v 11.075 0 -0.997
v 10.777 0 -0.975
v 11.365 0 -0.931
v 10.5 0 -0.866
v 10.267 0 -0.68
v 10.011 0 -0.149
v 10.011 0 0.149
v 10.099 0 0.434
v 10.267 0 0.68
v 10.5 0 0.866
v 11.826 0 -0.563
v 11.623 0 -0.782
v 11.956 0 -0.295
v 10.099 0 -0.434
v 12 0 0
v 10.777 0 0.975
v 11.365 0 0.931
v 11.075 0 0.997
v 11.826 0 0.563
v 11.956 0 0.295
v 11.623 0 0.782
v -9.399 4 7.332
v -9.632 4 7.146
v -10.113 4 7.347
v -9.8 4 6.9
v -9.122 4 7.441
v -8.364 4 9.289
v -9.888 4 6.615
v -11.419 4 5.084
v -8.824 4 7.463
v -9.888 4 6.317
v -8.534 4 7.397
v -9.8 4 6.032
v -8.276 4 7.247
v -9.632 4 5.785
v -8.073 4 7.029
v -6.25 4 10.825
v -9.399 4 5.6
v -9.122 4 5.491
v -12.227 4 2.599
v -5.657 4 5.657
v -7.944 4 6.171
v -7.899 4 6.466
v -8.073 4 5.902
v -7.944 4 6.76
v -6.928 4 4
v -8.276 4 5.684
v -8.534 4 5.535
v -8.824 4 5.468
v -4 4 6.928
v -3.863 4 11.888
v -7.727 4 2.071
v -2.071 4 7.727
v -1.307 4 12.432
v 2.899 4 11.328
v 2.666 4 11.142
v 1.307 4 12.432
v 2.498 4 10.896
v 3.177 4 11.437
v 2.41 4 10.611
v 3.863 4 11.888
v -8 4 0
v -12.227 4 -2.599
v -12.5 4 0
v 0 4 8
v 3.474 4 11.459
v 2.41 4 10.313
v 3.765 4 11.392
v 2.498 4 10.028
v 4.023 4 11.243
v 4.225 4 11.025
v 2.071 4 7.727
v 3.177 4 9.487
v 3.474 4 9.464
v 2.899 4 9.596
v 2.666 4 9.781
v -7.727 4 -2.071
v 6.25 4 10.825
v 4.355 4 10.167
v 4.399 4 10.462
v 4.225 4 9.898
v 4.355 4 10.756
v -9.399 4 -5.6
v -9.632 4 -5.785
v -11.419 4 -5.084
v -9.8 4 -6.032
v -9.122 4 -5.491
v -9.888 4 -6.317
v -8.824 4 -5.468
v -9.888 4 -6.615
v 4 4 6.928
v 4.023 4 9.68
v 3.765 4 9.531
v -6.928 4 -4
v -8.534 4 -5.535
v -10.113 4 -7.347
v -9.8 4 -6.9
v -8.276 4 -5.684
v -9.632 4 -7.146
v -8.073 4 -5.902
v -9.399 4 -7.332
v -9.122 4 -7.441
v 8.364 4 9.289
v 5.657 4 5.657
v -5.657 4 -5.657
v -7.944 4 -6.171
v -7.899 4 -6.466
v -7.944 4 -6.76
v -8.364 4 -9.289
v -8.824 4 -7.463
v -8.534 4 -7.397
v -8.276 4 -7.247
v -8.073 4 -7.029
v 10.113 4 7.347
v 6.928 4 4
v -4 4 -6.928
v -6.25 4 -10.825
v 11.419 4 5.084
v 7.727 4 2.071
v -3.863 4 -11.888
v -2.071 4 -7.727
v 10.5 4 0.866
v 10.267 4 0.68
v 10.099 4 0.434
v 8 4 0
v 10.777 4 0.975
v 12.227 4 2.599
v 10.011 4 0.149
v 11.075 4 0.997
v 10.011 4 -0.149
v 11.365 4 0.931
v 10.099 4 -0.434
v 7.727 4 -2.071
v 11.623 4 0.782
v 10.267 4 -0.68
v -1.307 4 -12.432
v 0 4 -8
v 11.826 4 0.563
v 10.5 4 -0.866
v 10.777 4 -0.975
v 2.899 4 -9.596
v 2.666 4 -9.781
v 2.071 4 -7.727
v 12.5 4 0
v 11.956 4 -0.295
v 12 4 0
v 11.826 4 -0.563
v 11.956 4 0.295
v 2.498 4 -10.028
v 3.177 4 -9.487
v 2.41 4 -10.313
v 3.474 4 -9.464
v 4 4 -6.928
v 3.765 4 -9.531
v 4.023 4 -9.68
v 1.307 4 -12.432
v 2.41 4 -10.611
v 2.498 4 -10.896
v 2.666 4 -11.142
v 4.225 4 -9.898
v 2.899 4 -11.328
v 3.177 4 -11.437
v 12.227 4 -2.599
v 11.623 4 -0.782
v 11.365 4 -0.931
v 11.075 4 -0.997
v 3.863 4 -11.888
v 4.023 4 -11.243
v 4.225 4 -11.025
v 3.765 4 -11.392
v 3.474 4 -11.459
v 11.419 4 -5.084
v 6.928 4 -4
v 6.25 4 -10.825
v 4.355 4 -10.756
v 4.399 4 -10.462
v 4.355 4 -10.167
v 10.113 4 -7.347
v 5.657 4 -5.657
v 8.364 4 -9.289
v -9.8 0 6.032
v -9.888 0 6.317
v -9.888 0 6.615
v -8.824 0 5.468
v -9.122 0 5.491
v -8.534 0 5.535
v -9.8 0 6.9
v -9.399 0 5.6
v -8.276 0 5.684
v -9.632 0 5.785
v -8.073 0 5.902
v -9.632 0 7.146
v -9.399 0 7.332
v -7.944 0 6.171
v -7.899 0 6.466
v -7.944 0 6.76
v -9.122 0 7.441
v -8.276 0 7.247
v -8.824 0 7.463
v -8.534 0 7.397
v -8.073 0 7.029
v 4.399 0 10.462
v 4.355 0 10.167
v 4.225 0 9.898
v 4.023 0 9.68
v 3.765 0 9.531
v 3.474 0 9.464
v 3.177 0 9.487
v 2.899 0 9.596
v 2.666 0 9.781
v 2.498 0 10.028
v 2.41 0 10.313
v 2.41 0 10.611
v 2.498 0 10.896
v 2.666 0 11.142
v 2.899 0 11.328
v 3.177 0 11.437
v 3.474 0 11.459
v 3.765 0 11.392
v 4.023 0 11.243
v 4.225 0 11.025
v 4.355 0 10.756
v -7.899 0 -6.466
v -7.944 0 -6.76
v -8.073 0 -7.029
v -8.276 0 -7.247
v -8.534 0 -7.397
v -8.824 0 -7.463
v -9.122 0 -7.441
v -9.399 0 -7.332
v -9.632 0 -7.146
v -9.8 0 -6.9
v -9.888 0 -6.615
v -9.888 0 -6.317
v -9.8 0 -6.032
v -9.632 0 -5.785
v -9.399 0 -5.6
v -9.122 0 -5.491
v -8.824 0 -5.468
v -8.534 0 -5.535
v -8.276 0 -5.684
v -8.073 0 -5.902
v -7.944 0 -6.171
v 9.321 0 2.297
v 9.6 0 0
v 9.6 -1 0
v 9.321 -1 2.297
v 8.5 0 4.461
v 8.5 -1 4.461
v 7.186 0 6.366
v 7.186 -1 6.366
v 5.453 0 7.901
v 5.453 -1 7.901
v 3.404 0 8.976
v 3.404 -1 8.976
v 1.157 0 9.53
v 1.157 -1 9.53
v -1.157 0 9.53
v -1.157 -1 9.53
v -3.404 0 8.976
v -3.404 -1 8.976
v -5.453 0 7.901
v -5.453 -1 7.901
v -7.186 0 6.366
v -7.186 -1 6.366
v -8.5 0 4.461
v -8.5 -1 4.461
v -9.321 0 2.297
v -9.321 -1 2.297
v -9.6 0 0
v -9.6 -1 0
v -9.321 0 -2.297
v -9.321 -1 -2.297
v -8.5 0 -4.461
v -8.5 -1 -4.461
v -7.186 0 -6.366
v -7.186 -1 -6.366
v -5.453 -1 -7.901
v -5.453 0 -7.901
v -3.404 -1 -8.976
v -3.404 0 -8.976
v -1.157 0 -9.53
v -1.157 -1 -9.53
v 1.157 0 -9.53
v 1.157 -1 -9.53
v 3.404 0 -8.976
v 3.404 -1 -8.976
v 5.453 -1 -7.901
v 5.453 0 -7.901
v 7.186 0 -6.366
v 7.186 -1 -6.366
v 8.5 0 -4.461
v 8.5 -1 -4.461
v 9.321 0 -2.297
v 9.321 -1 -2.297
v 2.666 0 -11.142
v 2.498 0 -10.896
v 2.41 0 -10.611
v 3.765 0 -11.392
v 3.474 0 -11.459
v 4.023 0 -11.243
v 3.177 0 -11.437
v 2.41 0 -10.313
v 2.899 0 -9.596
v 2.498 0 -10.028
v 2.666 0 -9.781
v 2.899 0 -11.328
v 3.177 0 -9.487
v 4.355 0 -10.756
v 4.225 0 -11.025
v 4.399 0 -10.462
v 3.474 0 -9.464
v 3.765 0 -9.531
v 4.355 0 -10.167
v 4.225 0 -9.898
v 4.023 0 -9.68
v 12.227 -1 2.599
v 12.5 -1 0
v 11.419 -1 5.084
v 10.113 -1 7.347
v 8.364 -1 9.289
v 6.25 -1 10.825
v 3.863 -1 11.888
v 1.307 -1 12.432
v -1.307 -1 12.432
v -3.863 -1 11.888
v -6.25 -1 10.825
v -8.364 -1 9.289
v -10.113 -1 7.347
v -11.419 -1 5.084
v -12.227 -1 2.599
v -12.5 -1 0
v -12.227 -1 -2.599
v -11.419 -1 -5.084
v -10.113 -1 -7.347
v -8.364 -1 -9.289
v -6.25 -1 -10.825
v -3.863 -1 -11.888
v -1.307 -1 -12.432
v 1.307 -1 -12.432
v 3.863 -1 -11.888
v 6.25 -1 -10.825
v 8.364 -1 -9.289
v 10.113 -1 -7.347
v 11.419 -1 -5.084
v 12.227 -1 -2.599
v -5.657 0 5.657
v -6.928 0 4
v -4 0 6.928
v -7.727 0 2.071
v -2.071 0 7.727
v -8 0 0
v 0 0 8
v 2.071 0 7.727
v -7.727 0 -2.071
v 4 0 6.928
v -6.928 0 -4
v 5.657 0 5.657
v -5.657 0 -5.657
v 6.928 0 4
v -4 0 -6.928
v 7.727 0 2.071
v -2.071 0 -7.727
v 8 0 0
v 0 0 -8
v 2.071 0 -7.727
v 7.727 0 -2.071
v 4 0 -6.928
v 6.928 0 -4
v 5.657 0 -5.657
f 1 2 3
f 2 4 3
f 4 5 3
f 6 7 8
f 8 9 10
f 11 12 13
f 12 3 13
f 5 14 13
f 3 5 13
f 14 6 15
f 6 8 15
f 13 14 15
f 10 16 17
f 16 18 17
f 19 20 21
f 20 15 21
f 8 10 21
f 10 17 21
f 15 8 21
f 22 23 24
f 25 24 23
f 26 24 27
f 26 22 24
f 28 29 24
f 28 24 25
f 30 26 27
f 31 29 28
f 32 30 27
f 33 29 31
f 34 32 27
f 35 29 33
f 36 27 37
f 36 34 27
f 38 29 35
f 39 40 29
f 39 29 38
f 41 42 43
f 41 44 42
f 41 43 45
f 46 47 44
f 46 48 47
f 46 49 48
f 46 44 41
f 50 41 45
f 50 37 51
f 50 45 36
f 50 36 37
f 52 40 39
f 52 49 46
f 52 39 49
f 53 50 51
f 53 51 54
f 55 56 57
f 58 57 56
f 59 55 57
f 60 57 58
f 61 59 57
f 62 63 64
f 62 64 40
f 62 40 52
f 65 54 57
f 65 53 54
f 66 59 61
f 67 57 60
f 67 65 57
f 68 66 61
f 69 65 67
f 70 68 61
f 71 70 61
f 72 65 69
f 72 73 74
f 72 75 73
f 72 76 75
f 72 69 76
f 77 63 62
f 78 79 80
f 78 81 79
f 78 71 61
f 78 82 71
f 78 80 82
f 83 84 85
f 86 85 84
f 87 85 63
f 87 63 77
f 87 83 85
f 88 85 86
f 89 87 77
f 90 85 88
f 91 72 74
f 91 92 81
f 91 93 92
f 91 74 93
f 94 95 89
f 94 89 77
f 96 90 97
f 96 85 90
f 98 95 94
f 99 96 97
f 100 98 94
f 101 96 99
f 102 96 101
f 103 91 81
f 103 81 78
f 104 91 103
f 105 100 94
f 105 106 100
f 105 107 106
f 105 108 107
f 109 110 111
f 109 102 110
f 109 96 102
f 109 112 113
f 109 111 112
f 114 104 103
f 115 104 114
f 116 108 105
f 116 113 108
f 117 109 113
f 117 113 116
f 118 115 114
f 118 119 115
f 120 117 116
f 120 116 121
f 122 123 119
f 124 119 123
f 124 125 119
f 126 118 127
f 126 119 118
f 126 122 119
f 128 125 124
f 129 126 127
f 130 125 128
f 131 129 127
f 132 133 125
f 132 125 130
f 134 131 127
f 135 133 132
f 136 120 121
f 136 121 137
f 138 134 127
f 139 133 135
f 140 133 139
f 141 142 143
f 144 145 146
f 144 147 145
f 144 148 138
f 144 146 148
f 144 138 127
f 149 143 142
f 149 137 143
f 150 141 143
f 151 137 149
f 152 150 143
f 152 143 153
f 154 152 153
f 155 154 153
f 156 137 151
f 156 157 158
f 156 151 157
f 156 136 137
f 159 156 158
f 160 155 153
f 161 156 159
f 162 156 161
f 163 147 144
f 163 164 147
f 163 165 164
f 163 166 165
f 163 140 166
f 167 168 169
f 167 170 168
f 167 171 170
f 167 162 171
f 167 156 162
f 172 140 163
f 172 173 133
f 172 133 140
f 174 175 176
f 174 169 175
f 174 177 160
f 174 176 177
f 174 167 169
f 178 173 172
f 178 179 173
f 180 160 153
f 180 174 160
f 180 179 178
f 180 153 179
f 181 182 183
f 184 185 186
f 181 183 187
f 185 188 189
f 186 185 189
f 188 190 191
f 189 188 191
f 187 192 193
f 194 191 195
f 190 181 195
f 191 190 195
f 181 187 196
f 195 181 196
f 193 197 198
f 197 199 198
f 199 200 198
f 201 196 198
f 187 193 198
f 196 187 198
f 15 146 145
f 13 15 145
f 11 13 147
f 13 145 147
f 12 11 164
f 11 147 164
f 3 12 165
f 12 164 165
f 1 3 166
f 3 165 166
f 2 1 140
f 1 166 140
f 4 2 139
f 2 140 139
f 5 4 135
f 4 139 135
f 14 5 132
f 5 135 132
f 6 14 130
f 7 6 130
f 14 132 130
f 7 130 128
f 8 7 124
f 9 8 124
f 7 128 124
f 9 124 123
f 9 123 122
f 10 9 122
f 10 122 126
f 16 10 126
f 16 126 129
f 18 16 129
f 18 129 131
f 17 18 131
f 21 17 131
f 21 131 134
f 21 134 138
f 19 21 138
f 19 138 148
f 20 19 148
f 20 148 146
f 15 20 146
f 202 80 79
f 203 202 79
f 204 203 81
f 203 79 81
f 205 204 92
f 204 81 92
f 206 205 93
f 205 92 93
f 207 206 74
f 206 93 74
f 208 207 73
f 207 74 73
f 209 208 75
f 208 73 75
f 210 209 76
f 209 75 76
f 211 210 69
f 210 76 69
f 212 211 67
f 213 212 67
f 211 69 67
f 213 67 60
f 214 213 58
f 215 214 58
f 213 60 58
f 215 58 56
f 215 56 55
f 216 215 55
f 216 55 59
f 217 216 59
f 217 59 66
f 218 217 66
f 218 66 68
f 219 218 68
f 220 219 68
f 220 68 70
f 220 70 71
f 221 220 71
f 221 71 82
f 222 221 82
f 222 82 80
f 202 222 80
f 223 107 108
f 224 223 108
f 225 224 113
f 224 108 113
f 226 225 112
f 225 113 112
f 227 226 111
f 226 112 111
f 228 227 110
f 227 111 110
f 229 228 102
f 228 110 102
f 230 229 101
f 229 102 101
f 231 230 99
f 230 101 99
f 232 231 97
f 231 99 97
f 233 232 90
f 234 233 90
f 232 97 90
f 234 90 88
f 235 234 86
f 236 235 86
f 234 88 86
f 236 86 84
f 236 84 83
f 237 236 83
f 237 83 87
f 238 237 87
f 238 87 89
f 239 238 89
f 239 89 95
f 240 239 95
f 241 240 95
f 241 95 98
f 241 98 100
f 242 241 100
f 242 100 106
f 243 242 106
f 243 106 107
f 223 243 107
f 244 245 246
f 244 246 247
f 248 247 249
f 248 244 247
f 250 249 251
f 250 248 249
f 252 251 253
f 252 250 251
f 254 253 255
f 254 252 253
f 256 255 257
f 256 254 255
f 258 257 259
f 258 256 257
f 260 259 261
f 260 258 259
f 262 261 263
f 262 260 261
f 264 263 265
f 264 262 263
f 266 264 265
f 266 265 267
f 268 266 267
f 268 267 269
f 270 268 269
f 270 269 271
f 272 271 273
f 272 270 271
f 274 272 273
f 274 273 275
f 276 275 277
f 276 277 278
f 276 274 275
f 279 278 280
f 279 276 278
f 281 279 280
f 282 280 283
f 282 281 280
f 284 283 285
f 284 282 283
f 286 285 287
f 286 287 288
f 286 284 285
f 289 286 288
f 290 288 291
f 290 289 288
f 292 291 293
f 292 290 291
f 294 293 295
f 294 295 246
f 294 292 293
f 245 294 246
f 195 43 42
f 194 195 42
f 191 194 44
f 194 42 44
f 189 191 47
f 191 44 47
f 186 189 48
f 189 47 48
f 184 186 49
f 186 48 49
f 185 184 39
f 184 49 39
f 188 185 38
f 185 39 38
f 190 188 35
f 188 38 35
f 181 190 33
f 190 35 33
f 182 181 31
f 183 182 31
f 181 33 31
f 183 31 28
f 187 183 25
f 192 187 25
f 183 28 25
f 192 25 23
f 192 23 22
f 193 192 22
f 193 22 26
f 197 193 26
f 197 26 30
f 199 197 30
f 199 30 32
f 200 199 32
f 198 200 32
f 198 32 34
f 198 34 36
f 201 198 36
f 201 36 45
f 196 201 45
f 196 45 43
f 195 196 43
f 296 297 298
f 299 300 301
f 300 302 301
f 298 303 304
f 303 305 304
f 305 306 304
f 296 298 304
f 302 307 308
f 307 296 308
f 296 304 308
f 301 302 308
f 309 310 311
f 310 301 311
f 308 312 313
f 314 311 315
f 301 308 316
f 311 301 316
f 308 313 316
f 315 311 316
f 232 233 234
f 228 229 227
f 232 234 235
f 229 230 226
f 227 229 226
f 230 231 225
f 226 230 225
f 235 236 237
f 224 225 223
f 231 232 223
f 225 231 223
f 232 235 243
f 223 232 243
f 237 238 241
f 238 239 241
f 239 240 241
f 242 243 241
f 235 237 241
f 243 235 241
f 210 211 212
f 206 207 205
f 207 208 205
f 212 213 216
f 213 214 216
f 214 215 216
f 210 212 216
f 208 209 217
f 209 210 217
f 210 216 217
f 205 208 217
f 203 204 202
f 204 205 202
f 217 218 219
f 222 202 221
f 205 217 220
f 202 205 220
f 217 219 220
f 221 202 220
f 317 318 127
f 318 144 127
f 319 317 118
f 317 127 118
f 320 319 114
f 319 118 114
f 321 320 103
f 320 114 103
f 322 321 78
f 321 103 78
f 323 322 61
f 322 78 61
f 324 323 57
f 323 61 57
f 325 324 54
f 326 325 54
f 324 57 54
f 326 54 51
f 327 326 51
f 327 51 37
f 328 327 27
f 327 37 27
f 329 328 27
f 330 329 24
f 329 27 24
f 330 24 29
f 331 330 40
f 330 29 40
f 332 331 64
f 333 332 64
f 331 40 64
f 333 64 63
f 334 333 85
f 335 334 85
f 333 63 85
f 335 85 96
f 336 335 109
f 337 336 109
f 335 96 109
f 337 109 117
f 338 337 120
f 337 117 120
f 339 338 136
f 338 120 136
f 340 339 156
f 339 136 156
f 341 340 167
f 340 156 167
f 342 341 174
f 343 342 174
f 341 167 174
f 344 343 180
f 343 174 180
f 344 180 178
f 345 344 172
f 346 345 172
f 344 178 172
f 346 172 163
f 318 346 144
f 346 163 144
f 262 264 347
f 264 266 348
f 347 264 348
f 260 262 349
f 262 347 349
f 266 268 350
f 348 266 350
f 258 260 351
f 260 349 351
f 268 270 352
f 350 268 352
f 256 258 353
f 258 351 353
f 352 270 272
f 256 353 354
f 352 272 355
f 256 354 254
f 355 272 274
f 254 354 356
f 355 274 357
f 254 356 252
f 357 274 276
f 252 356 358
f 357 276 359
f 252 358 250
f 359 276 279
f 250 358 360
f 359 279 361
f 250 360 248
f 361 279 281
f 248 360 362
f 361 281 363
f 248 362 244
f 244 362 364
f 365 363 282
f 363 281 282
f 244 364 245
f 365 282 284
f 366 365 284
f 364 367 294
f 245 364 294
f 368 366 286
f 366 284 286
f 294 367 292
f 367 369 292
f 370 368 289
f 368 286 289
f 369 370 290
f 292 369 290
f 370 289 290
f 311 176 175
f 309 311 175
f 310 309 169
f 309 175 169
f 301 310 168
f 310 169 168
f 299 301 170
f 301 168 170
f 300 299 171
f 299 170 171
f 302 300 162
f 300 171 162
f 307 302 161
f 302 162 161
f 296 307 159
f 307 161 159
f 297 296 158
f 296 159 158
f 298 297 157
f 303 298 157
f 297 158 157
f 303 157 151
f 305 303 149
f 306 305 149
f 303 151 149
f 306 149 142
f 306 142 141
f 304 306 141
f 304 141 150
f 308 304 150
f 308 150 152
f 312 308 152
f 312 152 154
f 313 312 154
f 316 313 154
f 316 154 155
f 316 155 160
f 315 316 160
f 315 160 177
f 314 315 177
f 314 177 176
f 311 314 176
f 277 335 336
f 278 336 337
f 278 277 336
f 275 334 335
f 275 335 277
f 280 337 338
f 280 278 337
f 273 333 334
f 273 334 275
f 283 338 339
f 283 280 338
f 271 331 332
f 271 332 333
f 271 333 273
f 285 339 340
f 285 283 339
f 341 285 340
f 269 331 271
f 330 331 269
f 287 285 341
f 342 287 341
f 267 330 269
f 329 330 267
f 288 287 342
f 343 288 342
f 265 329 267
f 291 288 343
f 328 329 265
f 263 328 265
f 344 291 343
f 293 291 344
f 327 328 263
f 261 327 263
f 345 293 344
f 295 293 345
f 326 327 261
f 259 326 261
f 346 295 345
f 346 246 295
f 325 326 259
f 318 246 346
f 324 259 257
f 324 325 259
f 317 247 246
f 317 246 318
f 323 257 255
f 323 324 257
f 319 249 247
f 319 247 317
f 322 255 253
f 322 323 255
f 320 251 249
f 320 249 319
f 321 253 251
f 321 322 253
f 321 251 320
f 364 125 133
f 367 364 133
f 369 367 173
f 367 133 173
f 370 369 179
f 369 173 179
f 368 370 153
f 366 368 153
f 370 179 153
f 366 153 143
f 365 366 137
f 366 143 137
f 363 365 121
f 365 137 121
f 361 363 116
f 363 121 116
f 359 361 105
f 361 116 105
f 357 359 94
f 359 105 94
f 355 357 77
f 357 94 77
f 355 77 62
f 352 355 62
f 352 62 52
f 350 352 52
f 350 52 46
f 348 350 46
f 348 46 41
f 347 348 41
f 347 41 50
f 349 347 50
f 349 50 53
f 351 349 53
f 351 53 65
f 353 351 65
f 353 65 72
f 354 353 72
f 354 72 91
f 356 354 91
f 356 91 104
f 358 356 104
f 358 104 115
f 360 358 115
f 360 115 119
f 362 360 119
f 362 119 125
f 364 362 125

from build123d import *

# Parameters (mm, degrees)
SKETCH_1_R          = 12.5
EXTRUDE_1_DEPTH     = 4
SKETCH_2_R          = 1
EXTRUDE_2_DEPTH     = 7.5
SKETCH_5_R          = 6
CUT_EXTRUDE_1_DEPTH = 10
SKETCH_7_R          = 1
CUT_EXTRUDE_2_DEPTH = 7.5
SKETCH_8_R          = 12.5
SKETCH_8_R_2        = 6
CUT_EXTRUDE_3_DEPTH = 10
SKETCH_9_R          = 1
EXTRUDE_3_DEPTH     = 10
SKETCH_10_R         = 1
CUT_EXTRUDE_4_DEPTH = 14
SKETCH_11_R         = 8
CUT_EXTRUDE_5_DEPTH = 10
SKETCH_13_R         = 12.5
SKETCH_13_R_2       = 9.6
EXTRUDE_5_DEPTH     = 1


with BuildPart() as part:
    # 草图1 → 凸台-拉伸1 (new body)
    with BuildSketch(Plane(origin=(0, 0, 0), x_dir=(1, 0, 0), z_dir=(0, 1, 0))):
        Circle(SKETCH_1_R)
    extrude(amount=EXTRUDE_1_DEPTH)

    # 草图2 → 凸台-拉伸2 (add)
    with BuildSketch(Plane(origin=(0, 4, 0), x_dir=(1, 0, 0), z_dir=(0, 1, 0))):
        with Locations((10, 0)):
            Circle(SKETCH_2_R)
        with Locations((3.399186938, -10.461621679)):
            Circle(SKETCH_2_R)
        with Locations((-8.590169944, -7.416694292)):
            Circle(SKETCH_2_R)
        with Locations((-9.399186938, 4.926796007)):
            Circle(SKETCH_2_R)
        with Locations((2.090169944, 9.510565163)):
            Circle(SKETCH_2_R)
    extrude(amount=EXTRUDE_2_DEPTH)

    # 草图5 → 切除-拉伸1 (cut)
    with BuildSketch(Plane(origin=(0, 4, 0), x_dir=(1, 0, 0), z_dir=(0, 1, 0))):
        Circle(SKETCH_5_R)
    extrude(amount=-CUT_EXTRUDE_1_DEPTH, mode=Mode.SUBTRACT)

    # 草图7 → 切除-拉伸2 (cut)
    with BuildSketch(Plane(origin=(0, 11.5, 0), x_dir=(1, 0, 0), z_dir=(0, 1, 0))):
        with Locations((-9.399186938, 4.926796007)):
            Circle(SKETCH_7_R)
    extrude(amount=-CUT_EXTRUDE_2_DEPTH, mode=Mode.SUBTRACT)

    # 草图8 → 切除-拉伸3 (cut)
    with BuildSketch(Plane(origin=(0, 4, 0), x_dir=(1, 0, 0), z_dir=(0, 1, 0))):
        Circle(SKETCH_8_R)
        Circle(SKETCH_8_R_2, mode=Mode.SUBTRACT)
    extrude(amount=CUT_EXTRUDE_3_DEPTH, mode=Mode.SUBTRACT)

    # 草图9 → 凸台-拉伸3 (add)
    with BuildSketch(Plane(origin=(0, 4, 0), x_dir=(1, 0, 0), z_dir=(0, 1, 0))):
        with Locations((11, 0)):
            Circle(SKETCH_9_R)
        with Locations((3.399186938, -10.461621679)):
            Circle(SKETCH_9_R)
        with Locations((-8.899186938, -6.465637775)):
            Circle(SKETCH_9_R)
        with Locations((-8.899186938, 6.465637775)):
            Circle(SKETCH_9_R)
        with Locations((3.399186938, 10.461621679)):
            Circle(SKETCH_9_R)
    extrude(amount=EXTRUDE_3_DEPTH)

    # 草图10 → 切除-拉伸4 (cut)
    with BuildSketch(Plane(origin=(0, 14, 0), x_dir=(1, 0, 0), z_dir=(0, 1, 0))):
        with Locations((-8.899186938, -6.465637775)):
            Circle(SKETCH_10_R)
        with Locations((3.399186938, -10.461621679)):
            Circle(SKETCH_10_R)
        with Locations((11, 0)):
            Circle(SKETCH_10_R)
        with Locations((3.399186938, 10.461621679)):
            Circle(SKETCH_10_R)
        with Locations((-8.899186938, 6.465637775)):
            Circle(SKETCH_10_R)
    extrude(amount=-CUT_EXTRUDE_4_DEPTH, mode=Mode.SUBTRACT)

    # 草图11 → 切除-拉伸5 (cut)
    with BuildSketch(Plane(origin=(0, 4, 0), x_dir=(1, 0, 0), z_dir=(0, 1, 0))):
        Circle(SKETCH_11_R)
    extrude(amount=-CUT_EXTRUDE_5_DEPTH, mode=Mode.SUBTRACT)

    # 草图13 → 凸台-拉伸5 (add)
    with BuildSketch(Plane.XZ):
        Circle(SKETCH_13_R)
        Circle(SKETCH_13_R_2, mode=Mode.SUBTRACT)
    extrude(amount=EXTRUDE_5_DEPTH)


solid = part.part
